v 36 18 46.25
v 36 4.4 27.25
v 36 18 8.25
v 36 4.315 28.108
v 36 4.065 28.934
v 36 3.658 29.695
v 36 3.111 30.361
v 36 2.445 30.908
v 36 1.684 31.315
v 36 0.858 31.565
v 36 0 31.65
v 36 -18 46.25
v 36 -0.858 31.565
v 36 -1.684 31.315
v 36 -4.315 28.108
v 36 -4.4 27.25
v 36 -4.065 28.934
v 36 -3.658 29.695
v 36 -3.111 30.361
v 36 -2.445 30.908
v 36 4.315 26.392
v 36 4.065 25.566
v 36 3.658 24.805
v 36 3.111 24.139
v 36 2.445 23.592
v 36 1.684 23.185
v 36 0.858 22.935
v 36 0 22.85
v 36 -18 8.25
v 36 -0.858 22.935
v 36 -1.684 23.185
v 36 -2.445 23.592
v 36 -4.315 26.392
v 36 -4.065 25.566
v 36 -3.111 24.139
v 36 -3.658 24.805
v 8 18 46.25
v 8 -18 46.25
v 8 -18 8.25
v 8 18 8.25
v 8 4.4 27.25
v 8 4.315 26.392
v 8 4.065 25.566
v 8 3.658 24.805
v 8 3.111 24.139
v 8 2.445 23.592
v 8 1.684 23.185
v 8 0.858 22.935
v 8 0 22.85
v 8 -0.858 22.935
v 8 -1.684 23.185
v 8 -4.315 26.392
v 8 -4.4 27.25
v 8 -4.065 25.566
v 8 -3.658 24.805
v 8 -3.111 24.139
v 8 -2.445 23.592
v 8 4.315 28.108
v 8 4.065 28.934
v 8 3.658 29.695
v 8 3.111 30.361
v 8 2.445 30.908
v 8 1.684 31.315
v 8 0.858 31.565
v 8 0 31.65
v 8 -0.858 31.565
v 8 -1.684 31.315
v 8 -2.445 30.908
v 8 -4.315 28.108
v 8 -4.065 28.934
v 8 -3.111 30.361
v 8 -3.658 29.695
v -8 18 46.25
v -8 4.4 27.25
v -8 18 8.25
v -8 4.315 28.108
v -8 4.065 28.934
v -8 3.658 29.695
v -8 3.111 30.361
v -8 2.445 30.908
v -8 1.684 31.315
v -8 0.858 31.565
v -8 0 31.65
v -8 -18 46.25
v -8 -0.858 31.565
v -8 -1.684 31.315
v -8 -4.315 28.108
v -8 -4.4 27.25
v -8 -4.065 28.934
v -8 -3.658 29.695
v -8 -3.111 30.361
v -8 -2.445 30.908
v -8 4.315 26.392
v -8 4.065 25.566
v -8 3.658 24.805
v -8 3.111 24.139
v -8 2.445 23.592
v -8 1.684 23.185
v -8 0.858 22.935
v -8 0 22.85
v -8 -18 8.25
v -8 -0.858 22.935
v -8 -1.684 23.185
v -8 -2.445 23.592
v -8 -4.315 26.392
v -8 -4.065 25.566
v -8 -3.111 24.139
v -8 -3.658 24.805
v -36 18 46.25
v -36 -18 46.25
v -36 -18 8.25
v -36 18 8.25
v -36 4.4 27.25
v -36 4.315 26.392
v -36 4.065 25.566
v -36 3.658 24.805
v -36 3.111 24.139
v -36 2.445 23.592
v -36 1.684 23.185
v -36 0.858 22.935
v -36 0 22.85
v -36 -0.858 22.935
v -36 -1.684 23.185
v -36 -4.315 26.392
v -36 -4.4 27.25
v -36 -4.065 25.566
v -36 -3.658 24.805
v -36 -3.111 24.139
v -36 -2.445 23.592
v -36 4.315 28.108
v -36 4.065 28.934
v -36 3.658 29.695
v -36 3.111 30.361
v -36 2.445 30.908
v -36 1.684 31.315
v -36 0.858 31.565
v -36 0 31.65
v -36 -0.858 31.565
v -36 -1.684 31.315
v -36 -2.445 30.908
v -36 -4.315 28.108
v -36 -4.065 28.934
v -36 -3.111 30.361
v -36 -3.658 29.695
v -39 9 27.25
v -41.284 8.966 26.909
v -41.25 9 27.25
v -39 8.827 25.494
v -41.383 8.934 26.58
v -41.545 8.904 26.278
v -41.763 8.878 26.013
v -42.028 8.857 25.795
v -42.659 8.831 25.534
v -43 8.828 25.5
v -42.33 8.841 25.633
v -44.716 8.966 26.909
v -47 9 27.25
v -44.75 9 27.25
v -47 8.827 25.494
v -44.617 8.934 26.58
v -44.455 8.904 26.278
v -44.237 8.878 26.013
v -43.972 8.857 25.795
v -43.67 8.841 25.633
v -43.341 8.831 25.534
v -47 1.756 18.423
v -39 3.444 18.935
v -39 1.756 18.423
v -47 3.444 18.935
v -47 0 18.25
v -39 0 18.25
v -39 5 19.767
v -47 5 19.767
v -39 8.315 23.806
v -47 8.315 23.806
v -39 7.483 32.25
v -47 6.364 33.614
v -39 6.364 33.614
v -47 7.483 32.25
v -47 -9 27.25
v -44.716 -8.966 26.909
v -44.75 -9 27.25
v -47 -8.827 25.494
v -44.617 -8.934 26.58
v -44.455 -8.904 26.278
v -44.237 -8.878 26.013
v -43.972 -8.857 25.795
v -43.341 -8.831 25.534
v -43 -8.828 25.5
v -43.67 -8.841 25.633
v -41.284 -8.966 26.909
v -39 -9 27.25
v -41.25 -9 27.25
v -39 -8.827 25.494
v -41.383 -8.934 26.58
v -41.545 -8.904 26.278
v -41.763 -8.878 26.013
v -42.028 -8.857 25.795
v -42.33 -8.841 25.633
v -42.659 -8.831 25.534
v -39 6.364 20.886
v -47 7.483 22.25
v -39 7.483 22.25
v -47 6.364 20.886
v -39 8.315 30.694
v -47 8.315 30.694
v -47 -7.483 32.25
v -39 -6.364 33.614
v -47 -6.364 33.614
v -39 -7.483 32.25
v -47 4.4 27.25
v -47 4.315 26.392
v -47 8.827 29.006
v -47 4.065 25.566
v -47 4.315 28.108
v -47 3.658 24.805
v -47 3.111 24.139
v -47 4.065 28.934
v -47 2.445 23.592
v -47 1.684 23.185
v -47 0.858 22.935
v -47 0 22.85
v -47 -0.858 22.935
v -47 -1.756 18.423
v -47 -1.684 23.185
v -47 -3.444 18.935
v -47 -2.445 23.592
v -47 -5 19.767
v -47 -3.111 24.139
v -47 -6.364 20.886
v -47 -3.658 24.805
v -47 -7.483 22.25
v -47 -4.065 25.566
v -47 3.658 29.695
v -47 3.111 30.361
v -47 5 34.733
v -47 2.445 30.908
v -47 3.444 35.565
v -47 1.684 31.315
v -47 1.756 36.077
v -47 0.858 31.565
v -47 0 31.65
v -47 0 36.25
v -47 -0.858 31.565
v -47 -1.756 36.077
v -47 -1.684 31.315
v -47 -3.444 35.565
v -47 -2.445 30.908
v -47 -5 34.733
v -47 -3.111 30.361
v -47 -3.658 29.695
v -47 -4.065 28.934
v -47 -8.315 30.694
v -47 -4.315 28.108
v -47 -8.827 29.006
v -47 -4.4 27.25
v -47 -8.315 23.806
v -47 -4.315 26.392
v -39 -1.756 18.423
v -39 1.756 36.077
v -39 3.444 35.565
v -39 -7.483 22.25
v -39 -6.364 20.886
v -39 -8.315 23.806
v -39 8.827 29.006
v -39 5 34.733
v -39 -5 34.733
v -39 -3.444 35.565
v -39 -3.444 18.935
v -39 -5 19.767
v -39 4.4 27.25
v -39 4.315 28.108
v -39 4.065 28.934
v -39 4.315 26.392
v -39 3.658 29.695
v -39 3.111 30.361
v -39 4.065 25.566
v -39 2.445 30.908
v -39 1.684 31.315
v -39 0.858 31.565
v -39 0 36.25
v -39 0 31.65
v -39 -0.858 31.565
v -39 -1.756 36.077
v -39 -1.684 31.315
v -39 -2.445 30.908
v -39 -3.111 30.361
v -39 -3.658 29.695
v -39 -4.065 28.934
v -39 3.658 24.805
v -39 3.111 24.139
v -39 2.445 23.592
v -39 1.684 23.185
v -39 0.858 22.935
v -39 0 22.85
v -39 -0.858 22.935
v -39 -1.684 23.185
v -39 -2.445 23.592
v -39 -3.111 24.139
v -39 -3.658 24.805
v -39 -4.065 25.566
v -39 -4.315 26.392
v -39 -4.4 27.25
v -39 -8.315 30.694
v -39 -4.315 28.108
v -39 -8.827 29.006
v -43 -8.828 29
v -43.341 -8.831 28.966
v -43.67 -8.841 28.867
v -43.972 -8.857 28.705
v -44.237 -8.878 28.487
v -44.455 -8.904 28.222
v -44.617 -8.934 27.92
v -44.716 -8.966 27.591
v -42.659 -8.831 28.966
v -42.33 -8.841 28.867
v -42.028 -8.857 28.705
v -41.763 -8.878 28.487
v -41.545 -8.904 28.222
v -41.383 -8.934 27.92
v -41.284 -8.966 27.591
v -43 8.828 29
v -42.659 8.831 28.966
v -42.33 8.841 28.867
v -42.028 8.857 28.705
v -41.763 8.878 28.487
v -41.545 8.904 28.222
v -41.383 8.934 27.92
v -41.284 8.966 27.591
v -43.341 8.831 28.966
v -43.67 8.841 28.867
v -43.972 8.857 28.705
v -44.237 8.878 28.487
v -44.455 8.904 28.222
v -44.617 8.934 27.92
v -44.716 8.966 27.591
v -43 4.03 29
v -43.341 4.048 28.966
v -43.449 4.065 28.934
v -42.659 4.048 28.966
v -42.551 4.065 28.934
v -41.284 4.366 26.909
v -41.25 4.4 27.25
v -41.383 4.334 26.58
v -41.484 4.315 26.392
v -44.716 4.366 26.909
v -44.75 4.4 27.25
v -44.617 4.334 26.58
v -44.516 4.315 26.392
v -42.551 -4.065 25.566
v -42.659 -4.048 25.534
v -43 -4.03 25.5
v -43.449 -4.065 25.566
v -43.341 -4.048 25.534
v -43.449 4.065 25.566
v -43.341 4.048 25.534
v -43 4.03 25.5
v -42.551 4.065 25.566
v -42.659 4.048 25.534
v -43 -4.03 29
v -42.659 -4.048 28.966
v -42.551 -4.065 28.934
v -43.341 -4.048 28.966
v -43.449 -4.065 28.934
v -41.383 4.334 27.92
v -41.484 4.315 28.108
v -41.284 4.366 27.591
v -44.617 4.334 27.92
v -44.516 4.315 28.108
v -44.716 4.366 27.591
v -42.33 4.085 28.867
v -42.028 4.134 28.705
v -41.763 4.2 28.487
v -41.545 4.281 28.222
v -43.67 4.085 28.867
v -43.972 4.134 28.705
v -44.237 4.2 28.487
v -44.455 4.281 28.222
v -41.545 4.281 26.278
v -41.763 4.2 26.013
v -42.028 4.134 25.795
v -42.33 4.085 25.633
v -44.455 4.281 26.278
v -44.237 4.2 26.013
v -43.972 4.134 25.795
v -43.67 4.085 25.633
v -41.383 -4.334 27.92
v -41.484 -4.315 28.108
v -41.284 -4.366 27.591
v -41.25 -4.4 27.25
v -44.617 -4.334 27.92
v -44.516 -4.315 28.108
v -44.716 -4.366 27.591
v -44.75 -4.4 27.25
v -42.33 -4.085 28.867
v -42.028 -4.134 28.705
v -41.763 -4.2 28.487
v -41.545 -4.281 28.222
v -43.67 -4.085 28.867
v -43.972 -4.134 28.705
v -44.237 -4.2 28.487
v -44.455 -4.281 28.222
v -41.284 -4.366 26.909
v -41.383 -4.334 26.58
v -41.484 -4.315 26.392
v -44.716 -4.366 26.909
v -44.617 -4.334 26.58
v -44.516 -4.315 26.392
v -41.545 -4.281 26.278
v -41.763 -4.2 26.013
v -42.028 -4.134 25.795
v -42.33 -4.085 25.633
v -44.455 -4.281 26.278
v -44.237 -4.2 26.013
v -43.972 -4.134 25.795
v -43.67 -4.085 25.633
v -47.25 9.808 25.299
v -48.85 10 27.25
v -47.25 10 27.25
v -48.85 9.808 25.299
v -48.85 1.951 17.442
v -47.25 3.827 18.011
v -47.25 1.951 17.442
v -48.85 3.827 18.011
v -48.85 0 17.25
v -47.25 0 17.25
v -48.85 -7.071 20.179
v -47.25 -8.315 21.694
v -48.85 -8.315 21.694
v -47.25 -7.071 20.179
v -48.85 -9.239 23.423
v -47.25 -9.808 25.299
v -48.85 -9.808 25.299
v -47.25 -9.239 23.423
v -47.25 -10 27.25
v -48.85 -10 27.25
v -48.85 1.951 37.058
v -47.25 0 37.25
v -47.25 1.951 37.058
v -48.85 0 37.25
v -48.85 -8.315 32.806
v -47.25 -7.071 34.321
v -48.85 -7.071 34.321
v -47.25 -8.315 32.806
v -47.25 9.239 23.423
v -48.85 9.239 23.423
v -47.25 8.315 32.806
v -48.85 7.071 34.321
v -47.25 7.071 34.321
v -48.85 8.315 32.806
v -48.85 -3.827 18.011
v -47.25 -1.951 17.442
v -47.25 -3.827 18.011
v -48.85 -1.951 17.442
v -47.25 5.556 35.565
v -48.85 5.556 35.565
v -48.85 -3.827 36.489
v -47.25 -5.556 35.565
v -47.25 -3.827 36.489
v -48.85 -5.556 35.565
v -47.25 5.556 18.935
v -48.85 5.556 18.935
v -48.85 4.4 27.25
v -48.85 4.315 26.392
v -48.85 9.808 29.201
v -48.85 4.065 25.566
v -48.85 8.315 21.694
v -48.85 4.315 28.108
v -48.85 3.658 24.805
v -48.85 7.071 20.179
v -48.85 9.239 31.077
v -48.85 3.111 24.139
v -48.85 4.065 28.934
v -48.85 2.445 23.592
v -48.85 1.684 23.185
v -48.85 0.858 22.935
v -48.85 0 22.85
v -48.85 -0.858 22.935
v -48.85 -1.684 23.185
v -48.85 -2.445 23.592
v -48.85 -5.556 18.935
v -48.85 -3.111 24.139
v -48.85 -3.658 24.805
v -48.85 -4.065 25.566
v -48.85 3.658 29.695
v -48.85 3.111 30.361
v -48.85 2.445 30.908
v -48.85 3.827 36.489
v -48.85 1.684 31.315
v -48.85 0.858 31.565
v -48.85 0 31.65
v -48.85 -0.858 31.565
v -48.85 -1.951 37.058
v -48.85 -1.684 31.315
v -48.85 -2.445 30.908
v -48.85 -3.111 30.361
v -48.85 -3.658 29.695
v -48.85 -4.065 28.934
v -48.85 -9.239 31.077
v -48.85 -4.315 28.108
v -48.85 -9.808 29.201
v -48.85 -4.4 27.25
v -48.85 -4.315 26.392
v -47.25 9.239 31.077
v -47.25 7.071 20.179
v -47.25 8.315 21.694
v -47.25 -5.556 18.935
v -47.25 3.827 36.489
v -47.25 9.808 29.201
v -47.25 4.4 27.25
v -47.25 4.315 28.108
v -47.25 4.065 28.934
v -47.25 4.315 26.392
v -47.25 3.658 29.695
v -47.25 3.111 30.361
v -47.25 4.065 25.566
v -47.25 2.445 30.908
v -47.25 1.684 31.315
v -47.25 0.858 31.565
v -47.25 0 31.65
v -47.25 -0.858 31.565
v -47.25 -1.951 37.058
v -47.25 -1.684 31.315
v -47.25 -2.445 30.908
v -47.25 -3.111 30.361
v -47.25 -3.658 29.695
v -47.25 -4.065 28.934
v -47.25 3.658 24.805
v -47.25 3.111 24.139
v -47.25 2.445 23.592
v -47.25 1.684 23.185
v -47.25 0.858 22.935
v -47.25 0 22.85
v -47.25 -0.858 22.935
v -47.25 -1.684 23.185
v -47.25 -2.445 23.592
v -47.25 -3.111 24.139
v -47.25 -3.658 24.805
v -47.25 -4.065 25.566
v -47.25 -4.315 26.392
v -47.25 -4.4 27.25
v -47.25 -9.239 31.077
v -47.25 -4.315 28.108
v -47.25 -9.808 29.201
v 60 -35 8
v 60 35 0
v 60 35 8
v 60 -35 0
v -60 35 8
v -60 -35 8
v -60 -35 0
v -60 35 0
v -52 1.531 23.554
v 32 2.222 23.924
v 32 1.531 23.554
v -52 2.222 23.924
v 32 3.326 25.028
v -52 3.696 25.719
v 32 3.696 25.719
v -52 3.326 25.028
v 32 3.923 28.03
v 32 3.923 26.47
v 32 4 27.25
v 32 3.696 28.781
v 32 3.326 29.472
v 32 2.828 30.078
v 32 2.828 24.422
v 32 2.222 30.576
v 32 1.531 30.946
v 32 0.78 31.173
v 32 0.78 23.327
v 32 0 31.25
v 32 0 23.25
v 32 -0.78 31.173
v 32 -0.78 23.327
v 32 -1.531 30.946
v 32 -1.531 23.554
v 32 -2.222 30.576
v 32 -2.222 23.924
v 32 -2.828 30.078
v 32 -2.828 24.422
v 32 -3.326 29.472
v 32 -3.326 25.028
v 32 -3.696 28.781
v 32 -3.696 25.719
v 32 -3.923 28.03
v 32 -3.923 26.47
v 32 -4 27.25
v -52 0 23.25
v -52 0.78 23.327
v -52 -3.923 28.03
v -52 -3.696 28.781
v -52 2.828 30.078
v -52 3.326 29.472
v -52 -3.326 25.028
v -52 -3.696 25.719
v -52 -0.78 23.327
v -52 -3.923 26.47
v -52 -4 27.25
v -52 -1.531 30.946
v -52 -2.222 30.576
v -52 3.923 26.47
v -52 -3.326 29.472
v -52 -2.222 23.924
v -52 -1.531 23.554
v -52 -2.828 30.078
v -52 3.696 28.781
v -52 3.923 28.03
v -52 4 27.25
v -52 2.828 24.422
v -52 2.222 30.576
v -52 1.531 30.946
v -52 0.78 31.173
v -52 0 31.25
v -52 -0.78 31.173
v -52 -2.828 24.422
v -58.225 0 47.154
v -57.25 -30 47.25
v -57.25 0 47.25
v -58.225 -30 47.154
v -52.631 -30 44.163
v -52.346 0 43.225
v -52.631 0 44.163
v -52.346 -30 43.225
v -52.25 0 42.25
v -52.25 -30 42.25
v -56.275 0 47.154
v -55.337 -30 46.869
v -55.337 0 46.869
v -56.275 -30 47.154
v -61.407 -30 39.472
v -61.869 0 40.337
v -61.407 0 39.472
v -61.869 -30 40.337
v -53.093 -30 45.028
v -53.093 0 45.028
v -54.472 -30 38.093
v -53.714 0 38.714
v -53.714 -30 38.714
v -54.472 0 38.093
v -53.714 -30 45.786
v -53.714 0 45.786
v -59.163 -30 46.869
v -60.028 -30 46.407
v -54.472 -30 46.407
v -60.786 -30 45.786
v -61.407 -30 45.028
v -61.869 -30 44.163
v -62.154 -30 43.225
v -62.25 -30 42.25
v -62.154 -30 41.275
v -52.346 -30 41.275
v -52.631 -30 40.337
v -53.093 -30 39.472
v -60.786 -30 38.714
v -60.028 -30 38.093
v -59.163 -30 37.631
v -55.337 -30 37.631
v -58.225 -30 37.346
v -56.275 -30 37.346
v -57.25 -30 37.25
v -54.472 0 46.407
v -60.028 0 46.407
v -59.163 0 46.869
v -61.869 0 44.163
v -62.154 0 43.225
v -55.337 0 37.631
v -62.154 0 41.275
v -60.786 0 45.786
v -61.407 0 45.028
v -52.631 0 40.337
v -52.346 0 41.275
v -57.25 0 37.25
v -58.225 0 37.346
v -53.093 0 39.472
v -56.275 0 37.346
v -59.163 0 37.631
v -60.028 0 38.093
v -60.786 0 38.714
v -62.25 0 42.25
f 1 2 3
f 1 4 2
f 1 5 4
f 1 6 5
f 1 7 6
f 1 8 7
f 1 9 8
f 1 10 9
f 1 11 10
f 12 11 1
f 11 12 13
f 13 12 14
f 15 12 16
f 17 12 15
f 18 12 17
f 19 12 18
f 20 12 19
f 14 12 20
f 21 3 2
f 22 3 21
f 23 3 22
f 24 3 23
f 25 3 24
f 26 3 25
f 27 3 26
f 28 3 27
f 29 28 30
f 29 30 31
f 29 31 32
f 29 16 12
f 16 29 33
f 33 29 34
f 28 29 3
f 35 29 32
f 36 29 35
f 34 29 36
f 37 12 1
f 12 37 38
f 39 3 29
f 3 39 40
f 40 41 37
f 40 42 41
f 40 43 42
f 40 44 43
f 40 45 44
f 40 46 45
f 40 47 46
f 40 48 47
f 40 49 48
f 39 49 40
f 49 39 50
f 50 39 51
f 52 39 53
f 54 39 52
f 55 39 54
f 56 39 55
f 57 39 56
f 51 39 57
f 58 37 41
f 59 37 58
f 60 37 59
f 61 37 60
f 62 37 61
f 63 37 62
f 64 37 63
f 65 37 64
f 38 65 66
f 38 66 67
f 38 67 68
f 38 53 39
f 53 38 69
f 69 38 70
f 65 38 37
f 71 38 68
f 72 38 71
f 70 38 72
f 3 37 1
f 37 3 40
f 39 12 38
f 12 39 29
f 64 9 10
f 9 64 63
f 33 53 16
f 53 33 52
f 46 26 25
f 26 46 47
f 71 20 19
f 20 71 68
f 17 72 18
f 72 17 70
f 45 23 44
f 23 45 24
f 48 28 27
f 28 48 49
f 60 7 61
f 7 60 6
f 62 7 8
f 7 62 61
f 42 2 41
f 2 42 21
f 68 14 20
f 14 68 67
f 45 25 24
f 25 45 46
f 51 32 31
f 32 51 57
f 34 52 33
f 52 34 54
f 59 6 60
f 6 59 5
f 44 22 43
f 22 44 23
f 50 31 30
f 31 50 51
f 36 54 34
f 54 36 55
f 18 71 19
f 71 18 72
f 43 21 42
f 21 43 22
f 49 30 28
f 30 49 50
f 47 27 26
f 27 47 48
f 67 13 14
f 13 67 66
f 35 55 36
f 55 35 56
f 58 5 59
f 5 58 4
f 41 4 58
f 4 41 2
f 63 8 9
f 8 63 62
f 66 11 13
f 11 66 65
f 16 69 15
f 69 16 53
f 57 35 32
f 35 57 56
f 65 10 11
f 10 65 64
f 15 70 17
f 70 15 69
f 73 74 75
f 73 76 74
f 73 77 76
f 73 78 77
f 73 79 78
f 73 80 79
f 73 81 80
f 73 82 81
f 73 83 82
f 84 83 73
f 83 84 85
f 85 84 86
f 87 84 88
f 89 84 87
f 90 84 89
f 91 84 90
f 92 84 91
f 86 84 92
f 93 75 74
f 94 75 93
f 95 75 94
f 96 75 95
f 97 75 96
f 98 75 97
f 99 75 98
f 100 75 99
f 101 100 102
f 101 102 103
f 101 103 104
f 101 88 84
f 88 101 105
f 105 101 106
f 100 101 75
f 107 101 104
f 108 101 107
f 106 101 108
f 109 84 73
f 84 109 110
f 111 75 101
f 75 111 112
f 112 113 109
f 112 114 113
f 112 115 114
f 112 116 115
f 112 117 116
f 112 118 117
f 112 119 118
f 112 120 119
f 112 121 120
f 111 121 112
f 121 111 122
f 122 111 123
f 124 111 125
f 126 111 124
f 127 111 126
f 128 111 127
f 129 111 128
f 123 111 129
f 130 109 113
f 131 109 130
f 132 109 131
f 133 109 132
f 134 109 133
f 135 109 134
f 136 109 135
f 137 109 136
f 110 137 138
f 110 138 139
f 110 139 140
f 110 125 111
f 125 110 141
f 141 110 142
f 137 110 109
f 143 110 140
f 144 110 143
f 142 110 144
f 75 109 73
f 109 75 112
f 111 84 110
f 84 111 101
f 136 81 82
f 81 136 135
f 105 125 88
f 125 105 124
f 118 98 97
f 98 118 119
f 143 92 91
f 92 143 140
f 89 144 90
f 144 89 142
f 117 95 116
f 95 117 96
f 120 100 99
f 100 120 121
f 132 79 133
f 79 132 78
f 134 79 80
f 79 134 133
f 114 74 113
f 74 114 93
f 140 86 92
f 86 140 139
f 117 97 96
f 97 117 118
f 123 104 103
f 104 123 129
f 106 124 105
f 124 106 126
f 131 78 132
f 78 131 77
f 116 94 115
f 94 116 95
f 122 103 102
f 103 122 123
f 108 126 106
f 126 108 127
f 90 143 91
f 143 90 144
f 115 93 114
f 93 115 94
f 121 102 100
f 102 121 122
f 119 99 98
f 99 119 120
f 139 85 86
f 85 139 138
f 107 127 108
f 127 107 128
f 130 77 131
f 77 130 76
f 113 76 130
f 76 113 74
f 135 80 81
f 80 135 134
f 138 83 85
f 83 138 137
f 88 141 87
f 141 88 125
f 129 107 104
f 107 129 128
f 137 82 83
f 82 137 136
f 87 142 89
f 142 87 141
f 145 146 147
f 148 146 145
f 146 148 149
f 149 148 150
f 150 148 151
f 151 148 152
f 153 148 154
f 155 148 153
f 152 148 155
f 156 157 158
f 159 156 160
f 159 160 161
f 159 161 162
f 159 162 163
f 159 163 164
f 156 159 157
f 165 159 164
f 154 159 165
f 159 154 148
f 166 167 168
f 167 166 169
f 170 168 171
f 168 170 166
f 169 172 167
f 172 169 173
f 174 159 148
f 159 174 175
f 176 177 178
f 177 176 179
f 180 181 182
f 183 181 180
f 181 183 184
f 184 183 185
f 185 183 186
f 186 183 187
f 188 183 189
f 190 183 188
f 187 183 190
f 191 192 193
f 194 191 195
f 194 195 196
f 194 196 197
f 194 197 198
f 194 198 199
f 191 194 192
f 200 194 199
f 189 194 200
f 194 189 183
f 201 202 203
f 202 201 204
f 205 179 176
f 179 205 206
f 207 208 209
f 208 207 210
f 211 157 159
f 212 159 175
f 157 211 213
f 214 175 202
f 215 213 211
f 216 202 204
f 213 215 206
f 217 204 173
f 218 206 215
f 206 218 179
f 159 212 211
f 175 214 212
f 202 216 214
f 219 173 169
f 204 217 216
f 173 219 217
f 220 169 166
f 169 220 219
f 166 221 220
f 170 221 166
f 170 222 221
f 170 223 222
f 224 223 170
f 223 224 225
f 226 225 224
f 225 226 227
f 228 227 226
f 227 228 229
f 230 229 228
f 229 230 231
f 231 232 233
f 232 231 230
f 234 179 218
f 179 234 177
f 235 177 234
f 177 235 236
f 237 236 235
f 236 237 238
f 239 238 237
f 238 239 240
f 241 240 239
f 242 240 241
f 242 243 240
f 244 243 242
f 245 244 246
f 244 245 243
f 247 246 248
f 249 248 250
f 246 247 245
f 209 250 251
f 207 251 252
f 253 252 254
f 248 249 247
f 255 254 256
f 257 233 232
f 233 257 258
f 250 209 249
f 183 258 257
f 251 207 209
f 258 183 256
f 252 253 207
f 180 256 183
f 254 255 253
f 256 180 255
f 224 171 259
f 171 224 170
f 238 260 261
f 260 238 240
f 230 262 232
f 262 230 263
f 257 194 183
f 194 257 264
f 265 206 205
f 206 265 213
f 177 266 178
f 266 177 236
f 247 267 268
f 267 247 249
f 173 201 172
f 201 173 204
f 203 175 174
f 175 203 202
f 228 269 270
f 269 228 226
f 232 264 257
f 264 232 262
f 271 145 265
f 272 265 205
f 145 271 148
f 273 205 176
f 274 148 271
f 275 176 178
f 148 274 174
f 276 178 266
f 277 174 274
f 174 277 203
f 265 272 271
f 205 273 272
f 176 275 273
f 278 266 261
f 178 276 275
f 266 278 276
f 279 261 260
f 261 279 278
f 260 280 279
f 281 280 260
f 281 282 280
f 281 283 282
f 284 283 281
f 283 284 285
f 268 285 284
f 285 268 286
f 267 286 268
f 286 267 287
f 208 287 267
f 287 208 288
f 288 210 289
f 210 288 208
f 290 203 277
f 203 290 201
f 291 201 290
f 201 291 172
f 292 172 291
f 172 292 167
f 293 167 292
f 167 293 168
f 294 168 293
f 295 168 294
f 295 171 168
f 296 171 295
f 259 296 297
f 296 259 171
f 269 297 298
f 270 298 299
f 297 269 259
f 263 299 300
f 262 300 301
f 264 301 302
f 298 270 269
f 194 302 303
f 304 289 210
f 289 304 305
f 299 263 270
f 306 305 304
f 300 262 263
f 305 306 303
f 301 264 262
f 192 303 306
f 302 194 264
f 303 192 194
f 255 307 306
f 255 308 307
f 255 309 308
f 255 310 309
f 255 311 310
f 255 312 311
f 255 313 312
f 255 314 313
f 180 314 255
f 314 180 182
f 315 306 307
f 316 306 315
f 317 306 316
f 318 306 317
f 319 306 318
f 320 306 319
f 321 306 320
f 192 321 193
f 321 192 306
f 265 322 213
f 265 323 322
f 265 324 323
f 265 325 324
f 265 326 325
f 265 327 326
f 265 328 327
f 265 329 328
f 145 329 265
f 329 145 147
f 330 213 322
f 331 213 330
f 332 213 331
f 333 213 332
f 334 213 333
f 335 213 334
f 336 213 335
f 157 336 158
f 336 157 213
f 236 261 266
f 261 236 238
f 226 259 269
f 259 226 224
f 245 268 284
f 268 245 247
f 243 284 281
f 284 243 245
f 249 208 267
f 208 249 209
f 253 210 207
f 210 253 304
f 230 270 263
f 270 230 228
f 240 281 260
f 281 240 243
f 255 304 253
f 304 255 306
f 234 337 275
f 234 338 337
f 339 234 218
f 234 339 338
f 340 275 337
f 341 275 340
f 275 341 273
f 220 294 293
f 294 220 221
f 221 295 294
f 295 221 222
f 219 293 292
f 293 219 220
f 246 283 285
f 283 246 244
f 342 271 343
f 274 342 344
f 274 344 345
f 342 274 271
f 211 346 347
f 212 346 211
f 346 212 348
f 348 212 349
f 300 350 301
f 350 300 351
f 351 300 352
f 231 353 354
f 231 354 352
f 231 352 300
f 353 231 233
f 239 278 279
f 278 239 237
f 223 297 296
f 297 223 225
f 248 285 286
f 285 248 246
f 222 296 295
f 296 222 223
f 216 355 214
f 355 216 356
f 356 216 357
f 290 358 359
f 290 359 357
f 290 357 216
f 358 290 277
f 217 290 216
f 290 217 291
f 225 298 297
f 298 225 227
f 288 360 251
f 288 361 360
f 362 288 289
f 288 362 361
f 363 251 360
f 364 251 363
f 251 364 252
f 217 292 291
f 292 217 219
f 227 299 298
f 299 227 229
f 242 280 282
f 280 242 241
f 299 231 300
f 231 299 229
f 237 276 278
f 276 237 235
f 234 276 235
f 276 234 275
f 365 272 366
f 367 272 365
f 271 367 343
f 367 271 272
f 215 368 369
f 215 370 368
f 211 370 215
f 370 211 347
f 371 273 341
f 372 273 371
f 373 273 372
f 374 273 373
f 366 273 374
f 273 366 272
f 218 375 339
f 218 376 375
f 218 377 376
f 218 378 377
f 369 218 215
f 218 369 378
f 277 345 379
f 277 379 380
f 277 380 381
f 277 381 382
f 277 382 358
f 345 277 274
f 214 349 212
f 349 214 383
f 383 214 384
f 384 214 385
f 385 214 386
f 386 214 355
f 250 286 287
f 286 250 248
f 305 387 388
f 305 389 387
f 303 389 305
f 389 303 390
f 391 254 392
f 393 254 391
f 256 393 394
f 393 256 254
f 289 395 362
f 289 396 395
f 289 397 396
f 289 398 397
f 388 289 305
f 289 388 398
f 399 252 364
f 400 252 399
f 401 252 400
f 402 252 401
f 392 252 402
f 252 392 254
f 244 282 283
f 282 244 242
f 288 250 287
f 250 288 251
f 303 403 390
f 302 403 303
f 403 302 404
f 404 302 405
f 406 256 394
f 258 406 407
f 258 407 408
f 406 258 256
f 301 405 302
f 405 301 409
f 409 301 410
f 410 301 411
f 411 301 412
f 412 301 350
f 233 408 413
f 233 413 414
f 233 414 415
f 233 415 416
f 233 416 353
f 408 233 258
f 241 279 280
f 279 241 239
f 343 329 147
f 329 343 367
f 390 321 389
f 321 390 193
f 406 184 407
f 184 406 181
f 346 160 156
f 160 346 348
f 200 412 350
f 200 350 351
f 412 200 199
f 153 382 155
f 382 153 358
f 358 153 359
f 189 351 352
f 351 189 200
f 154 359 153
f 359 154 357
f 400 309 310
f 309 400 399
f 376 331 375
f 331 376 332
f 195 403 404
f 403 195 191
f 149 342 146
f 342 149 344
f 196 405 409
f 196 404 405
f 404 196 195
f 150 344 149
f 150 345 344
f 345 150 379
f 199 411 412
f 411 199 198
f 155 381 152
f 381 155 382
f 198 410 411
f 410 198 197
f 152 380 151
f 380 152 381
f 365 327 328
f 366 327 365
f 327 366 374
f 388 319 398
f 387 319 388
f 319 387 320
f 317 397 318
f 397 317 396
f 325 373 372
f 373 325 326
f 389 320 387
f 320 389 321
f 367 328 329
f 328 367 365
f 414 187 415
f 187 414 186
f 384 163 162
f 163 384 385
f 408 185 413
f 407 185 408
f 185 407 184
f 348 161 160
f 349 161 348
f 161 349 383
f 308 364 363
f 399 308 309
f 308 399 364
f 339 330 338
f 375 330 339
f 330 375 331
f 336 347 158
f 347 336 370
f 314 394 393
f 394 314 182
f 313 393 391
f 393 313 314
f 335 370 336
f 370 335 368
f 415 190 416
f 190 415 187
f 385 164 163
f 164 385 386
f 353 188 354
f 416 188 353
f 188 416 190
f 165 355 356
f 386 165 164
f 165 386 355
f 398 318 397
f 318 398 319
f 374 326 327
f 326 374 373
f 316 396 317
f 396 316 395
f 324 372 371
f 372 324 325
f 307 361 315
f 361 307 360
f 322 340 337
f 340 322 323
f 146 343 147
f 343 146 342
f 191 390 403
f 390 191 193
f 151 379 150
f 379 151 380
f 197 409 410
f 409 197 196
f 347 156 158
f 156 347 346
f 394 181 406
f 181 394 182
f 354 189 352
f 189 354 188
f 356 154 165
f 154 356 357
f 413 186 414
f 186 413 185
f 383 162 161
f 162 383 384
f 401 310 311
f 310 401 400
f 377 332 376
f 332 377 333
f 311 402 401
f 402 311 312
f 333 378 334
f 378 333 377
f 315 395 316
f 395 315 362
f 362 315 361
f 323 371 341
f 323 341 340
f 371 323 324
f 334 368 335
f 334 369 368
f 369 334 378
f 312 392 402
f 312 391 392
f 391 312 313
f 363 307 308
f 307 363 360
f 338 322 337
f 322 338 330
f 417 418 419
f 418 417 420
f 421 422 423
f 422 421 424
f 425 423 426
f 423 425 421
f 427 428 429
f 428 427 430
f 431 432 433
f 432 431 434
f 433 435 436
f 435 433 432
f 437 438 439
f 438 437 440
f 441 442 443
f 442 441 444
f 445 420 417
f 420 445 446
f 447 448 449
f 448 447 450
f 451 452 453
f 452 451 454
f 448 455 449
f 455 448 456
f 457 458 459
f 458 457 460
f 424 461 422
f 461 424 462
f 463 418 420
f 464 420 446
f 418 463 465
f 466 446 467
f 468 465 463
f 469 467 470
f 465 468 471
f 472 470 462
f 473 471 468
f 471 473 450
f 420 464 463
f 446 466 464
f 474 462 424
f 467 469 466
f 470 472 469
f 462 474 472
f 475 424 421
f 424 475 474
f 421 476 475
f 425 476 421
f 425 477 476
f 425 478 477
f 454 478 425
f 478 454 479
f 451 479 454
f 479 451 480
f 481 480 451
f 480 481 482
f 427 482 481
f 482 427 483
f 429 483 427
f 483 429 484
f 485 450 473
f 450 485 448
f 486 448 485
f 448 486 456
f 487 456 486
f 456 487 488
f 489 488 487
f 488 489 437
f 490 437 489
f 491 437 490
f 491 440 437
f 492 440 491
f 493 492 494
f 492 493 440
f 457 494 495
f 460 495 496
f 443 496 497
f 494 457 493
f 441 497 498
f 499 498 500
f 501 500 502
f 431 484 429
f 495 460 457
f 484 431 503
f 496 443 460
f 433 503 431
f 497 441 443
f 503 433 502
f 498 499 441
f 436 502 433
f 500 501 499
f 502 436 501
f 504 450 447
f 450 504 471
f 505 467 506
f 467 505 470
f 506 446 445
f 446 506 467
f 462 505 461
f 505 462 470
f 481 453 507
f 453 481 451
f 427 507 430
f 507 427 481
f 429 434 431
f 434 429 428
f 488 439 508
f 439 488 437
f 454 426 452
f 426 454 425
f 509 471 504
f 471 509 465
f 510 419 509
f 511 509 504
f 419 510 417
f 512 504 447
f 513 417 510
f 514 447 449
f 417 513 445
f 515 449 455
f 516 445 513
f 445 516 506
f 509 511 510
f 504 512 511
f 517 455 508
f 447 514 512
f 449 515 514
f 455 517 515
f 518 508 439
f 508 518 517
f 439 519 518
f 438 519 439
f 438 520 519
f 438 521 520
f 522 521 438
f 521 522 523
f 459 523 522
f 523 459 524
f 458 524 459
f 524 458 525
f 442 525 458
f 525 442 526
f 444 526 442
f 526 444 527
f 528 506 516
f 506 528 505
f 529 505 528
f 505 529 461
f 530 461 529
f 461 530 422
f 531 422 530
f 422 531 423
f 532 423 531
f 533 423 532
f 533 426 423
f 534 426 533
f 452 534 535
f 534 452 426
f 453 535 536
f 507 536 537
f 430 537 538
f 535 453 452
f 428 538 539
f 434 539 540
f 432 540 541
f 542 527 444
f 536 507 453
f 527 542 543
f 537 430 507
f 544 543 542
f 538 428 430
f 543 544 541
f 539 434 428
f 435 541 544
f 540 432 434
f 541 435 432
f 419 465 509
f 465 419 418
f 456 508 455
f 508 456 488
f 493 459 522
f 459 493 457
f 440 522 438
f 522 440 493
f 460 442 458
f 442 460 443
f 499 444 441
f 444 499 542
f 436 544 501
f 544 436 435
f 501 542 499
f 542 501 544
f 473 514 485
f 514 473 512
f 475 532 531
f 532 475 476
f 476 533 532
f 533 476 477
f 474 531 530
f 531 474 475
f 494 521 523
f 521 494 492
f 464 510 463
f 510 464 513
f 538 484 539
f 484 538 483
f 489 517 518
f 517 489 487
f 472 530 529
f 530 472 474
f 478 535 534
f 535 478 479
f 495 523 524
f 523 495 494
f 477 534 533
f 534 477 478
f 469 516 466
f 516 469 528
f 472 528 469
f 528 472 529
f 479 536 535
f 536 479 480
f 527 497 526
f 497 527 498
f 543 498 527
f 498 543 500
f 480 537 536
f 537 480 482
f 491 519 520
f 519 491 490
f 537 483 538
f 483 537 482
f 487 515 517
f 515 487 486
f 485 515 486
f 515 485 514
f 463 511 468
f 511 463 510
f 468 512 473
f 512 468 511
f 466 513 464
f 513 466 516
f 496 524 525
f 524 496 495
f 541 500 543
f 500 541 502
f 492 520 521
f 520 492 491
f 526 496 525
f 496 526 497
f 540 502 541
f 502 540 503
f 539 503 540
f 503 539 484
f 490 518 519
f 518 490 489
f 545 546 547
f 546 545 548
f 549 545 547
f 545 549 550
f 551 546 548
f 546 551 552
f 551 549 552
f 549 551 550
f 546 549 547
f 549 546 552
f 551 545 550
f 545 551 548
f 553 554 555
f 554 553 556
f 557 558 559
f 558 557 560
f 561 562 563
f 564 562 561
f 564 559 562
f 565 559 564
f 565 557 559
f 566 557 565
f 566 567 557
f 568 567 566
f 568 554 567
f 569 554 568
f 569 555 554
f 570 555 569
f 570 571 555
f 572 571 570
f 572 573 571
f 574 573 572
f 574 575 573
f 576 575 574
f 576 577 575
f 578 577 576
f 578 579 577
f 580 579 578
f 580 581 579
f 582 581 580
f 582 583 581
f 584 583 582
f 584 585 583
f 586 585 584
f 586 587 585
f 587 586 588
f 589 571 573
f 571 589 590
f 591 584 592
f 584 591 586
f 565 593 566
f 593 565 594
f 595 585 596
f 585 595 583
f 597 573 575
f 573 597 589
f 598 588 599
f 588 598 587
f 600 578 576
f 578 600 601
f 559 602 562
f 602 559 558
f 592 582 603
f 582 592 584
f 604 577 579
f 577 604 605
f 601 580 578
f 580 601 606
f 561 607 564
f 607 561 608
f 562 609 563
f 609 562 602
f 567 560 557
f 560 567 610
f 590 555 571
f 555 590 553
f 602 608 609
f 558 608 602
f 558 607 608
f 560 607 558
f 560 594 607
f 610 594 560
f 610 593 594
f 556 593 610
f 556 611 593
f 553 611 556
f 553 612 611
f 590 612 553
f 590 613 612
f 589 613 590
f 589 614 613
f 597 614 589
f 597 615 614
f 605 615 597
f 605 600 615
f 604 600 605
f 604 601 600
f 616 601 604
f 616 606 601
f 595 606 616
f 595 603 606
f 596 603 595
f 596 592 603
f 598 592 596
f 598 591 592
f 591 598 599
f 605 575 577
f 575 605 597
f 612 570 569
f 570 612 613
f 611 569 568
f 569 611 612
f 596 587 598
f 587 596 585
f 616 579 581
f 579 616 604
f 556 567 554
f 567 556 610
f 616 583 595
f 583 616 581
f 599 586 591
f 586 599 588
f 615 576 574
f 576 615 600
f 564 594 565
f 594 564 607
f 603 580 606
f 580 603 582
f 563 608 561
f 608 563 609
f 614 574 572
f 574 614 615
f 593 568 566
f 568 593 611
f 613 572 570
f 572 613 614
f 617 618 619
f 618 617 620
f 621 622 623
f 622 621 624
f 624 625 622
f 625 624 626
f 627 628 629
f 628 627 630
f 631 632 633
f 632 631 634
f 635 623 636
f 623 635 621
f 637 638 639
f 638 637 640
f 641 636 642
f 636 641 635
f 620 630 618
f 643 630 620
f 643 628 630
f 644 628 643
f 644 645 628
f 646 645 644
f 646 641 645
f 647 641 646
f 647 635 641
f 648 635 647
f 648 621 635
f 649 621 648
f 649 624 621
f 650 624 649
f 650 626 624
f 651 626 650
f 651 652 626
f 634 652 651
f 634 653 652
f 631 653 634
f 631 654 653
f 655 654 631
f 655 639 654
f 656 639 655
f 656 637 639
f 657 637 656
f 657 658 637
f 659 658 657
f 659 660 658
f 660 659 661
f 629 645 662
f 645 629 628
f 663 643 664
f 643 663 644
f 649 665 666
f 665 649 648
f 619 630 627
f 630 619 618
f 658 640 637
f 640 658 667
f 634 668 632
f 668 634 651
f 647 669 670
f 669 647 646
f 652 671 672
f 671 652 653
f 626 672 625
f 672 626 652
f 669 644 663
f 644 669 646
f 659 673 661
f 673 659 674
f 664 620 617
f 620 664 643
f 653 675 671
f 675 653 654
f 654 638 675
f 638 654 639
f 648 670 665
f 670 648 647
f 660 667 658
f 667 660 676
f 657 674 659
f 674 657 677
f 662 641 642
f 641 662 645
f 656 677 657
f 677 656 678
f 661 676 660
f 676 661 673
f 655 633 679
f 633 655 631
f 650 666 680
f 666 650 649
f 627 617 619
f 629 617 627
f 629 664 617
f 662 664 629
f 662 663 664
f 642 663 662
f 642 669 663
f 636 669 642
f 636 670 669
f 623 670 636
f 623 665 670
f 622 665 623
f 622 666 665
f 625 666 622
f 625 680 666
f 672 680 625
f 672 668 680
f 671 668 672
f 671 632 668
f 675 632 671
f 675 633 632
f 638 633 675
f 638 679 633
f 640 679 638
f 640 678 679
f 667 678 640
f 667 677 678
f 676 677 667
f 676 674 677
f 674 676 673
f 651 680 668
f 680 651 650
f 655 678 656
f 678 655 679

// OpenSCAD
$fn = 32;

// ------------------------------------------------------------------------
// Machine vise: screw d8, jaws 28 x 38 mm
// Every part is its own module, assembly() places every instance.
// ------------------------------------------------------------------------

// --- part 1 ---
module vise_bed() {
  difference() {
    translate([-60, -35, 0]) cube([120, 70, 8]);
  }
}

// --- part 2 ---
module vise_jaw() {
  difference() {
    translate([-14, -18, 0]) cube([28, 36, 38]);
    translate([0, 0, 19]) rotate([0, 90, 0]) cylinder(h = 30, d = 8.8, center = true);
  }
}

// --- part 3 ---
module vise_screw() {
  translate([0, 0, -42]) cylinder(h = 84, d = 8);
}

// --- part 4 ---
module screw_collar() {
  difference() {
    cylinder(h = 8, d = 18);
    translate([0, 0, -1]) cylinder(h = 10, d = 8.8);
    translate([0, 0, 4]) rotate([90, 0, 0]) cylinder(h = 20, d = 3.5, center = true);
  }
}

// --- part 5 ---
module screw_washer() {
  difference() {
      translate([0, 0, 0]) cylinder(h = 1.6, d = 20);
      translate([0, 0, -1]) cylinder(h = 3.6, d = 8.8);
    }
}

// --- part 6 ---
module vise_handle() {
  cylinder(h = 30, d = 10);
}

// --- assembly ---
module assembly() {
  color([0.80, 0.24, 0.20]) translate([0, 0, 0]) rotate([0, 0, 0]) vise_bed();
  color([0.20, 0.45, 0.75]) translate([22, 0, 8.25]) rotate([0, 0, 0]) vise_jaw();
  color([0.25, 0.62, 0.32]) translate([-22, 0, 8.25]) rotate([0, 0, 0]) vise_jaw();
  color([0.92, 0.70, 0.18]) translate([-10, 0, 27.25]) rotate([0, 90, 0]) vise_screw();
  color([0.58, 0.35, 0.70]) translate([-47, 0, 27.25]) rotate([0, 90, 0]) screw_collar();
  color([0.16, 0.66, 0.66]) translate([-48.85, 0, 27.25]) rotate([0, 90, 0]) screw_washer();
  color([0.85, 0.48, 0.18]) translate([-57.25, 0, 42.25]) rotate([90, 0, 0]) vise_handle();
}

assembly();
